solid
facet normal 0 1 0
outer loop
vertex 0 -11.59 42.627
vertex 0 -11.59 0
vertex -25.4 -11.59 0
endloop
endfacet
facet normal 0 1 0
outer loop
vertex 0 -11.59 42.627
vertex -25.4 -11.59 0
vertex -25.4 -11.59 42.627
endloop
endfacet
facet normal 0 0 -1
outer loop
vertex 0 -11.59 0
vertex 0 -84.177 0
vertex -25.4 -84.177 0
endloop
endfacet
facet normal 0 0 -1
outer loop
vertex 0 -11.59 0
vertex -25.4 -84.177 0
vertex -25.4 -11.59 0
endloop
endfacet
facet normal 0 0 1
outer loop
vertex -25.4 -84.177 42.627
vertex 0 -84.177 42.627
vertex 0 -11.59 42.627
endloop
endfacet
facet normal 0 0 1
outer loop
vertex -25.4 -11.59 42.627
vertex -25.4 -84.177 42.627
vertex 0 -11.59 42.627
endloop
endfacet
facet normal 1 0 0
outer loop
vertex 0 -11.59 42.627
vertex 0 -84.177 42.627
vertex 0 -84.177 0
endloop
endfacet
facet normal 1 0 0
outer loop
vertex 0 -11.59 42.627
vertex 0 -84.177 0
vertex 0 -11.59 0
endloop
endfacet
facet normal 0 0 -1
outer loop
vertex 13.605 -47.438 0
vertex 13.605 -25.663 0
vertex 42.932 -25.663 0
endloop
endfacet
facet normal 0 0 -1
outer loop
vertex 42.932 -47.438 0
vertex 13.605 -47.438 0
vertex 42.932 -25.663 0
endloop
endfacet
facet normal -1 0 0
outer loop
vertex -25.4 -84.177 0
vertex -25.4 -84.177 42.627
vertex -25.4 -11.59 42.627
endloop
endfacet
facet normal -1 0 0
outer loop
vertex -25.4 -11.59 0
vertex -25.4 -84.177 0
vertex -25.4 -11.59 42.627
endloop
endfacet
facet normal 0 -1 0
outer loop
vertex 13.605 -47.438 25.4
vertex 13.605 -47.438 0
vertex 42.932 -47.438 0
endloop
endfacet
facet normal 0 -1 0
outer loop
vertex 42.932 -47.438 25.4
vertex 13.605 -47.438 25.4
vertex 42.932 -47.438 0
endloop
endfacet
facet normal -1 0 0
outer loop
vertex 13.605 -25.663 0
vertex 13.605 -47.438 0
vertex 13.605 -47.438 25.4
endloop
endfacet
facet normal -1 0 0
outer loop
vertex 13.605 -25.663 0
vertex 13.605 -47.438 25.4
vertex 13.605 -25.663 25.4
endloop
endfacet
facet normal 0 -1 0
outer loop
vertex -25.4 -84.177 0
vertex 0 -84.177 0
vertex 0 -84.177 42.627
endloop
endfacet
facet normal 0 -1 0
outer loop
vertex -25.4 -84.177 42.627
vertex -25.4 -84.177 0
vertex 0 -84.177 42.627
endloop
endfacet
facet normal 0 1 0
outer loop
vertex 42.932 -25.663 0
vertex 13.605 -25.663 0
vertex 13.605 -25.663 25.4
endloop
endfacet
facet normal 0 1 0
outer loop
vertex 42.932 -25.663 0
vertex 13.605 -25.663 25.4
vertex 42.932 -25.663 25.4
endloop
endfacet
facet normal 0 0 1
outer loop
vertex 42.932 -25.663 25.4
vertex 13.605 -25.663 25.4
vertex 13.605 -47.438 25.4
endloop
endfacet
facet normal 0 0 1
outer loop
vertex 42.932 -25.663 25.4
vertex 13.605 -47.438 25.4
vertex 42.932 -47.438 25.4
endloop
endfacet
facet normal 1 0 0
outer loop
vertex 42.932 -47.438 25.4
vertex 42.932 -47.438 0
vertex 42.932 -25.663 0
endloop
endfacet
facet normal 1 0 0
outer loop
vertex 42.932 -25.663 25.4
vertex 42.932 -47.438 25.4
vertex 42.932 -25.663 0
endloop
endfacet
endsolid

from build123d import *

# Parameters (mm, degrees)
F0_W     = 72.587258
F0_H     = 42.627126
F1_DEPTH = 25.4
F2_W     = 29.326936
F2_H     = 21.774795
F3_DEPTH = 25.4


with BuildPart() as f1:
    # F0 (on Right) → F1 (new body)
    with BuildSketch(Plane.YZ):
        with Locations((-47.883656, 21.313563)):
            Rectangle(F0_W, F0_H)
    extrude(amount=-F1_DEPTH)


with BuildPart() as f3:
    # F2 (on Top) → F3 (new body)
    with BuildSketch(Plane.XY):
        with Locations((28.268439, -36.550342)):
            Rectangle(F2_W, F2_H)
    extrude(amount=F3_DEPTH)


solid = Compound([f1.part, f3.part])
